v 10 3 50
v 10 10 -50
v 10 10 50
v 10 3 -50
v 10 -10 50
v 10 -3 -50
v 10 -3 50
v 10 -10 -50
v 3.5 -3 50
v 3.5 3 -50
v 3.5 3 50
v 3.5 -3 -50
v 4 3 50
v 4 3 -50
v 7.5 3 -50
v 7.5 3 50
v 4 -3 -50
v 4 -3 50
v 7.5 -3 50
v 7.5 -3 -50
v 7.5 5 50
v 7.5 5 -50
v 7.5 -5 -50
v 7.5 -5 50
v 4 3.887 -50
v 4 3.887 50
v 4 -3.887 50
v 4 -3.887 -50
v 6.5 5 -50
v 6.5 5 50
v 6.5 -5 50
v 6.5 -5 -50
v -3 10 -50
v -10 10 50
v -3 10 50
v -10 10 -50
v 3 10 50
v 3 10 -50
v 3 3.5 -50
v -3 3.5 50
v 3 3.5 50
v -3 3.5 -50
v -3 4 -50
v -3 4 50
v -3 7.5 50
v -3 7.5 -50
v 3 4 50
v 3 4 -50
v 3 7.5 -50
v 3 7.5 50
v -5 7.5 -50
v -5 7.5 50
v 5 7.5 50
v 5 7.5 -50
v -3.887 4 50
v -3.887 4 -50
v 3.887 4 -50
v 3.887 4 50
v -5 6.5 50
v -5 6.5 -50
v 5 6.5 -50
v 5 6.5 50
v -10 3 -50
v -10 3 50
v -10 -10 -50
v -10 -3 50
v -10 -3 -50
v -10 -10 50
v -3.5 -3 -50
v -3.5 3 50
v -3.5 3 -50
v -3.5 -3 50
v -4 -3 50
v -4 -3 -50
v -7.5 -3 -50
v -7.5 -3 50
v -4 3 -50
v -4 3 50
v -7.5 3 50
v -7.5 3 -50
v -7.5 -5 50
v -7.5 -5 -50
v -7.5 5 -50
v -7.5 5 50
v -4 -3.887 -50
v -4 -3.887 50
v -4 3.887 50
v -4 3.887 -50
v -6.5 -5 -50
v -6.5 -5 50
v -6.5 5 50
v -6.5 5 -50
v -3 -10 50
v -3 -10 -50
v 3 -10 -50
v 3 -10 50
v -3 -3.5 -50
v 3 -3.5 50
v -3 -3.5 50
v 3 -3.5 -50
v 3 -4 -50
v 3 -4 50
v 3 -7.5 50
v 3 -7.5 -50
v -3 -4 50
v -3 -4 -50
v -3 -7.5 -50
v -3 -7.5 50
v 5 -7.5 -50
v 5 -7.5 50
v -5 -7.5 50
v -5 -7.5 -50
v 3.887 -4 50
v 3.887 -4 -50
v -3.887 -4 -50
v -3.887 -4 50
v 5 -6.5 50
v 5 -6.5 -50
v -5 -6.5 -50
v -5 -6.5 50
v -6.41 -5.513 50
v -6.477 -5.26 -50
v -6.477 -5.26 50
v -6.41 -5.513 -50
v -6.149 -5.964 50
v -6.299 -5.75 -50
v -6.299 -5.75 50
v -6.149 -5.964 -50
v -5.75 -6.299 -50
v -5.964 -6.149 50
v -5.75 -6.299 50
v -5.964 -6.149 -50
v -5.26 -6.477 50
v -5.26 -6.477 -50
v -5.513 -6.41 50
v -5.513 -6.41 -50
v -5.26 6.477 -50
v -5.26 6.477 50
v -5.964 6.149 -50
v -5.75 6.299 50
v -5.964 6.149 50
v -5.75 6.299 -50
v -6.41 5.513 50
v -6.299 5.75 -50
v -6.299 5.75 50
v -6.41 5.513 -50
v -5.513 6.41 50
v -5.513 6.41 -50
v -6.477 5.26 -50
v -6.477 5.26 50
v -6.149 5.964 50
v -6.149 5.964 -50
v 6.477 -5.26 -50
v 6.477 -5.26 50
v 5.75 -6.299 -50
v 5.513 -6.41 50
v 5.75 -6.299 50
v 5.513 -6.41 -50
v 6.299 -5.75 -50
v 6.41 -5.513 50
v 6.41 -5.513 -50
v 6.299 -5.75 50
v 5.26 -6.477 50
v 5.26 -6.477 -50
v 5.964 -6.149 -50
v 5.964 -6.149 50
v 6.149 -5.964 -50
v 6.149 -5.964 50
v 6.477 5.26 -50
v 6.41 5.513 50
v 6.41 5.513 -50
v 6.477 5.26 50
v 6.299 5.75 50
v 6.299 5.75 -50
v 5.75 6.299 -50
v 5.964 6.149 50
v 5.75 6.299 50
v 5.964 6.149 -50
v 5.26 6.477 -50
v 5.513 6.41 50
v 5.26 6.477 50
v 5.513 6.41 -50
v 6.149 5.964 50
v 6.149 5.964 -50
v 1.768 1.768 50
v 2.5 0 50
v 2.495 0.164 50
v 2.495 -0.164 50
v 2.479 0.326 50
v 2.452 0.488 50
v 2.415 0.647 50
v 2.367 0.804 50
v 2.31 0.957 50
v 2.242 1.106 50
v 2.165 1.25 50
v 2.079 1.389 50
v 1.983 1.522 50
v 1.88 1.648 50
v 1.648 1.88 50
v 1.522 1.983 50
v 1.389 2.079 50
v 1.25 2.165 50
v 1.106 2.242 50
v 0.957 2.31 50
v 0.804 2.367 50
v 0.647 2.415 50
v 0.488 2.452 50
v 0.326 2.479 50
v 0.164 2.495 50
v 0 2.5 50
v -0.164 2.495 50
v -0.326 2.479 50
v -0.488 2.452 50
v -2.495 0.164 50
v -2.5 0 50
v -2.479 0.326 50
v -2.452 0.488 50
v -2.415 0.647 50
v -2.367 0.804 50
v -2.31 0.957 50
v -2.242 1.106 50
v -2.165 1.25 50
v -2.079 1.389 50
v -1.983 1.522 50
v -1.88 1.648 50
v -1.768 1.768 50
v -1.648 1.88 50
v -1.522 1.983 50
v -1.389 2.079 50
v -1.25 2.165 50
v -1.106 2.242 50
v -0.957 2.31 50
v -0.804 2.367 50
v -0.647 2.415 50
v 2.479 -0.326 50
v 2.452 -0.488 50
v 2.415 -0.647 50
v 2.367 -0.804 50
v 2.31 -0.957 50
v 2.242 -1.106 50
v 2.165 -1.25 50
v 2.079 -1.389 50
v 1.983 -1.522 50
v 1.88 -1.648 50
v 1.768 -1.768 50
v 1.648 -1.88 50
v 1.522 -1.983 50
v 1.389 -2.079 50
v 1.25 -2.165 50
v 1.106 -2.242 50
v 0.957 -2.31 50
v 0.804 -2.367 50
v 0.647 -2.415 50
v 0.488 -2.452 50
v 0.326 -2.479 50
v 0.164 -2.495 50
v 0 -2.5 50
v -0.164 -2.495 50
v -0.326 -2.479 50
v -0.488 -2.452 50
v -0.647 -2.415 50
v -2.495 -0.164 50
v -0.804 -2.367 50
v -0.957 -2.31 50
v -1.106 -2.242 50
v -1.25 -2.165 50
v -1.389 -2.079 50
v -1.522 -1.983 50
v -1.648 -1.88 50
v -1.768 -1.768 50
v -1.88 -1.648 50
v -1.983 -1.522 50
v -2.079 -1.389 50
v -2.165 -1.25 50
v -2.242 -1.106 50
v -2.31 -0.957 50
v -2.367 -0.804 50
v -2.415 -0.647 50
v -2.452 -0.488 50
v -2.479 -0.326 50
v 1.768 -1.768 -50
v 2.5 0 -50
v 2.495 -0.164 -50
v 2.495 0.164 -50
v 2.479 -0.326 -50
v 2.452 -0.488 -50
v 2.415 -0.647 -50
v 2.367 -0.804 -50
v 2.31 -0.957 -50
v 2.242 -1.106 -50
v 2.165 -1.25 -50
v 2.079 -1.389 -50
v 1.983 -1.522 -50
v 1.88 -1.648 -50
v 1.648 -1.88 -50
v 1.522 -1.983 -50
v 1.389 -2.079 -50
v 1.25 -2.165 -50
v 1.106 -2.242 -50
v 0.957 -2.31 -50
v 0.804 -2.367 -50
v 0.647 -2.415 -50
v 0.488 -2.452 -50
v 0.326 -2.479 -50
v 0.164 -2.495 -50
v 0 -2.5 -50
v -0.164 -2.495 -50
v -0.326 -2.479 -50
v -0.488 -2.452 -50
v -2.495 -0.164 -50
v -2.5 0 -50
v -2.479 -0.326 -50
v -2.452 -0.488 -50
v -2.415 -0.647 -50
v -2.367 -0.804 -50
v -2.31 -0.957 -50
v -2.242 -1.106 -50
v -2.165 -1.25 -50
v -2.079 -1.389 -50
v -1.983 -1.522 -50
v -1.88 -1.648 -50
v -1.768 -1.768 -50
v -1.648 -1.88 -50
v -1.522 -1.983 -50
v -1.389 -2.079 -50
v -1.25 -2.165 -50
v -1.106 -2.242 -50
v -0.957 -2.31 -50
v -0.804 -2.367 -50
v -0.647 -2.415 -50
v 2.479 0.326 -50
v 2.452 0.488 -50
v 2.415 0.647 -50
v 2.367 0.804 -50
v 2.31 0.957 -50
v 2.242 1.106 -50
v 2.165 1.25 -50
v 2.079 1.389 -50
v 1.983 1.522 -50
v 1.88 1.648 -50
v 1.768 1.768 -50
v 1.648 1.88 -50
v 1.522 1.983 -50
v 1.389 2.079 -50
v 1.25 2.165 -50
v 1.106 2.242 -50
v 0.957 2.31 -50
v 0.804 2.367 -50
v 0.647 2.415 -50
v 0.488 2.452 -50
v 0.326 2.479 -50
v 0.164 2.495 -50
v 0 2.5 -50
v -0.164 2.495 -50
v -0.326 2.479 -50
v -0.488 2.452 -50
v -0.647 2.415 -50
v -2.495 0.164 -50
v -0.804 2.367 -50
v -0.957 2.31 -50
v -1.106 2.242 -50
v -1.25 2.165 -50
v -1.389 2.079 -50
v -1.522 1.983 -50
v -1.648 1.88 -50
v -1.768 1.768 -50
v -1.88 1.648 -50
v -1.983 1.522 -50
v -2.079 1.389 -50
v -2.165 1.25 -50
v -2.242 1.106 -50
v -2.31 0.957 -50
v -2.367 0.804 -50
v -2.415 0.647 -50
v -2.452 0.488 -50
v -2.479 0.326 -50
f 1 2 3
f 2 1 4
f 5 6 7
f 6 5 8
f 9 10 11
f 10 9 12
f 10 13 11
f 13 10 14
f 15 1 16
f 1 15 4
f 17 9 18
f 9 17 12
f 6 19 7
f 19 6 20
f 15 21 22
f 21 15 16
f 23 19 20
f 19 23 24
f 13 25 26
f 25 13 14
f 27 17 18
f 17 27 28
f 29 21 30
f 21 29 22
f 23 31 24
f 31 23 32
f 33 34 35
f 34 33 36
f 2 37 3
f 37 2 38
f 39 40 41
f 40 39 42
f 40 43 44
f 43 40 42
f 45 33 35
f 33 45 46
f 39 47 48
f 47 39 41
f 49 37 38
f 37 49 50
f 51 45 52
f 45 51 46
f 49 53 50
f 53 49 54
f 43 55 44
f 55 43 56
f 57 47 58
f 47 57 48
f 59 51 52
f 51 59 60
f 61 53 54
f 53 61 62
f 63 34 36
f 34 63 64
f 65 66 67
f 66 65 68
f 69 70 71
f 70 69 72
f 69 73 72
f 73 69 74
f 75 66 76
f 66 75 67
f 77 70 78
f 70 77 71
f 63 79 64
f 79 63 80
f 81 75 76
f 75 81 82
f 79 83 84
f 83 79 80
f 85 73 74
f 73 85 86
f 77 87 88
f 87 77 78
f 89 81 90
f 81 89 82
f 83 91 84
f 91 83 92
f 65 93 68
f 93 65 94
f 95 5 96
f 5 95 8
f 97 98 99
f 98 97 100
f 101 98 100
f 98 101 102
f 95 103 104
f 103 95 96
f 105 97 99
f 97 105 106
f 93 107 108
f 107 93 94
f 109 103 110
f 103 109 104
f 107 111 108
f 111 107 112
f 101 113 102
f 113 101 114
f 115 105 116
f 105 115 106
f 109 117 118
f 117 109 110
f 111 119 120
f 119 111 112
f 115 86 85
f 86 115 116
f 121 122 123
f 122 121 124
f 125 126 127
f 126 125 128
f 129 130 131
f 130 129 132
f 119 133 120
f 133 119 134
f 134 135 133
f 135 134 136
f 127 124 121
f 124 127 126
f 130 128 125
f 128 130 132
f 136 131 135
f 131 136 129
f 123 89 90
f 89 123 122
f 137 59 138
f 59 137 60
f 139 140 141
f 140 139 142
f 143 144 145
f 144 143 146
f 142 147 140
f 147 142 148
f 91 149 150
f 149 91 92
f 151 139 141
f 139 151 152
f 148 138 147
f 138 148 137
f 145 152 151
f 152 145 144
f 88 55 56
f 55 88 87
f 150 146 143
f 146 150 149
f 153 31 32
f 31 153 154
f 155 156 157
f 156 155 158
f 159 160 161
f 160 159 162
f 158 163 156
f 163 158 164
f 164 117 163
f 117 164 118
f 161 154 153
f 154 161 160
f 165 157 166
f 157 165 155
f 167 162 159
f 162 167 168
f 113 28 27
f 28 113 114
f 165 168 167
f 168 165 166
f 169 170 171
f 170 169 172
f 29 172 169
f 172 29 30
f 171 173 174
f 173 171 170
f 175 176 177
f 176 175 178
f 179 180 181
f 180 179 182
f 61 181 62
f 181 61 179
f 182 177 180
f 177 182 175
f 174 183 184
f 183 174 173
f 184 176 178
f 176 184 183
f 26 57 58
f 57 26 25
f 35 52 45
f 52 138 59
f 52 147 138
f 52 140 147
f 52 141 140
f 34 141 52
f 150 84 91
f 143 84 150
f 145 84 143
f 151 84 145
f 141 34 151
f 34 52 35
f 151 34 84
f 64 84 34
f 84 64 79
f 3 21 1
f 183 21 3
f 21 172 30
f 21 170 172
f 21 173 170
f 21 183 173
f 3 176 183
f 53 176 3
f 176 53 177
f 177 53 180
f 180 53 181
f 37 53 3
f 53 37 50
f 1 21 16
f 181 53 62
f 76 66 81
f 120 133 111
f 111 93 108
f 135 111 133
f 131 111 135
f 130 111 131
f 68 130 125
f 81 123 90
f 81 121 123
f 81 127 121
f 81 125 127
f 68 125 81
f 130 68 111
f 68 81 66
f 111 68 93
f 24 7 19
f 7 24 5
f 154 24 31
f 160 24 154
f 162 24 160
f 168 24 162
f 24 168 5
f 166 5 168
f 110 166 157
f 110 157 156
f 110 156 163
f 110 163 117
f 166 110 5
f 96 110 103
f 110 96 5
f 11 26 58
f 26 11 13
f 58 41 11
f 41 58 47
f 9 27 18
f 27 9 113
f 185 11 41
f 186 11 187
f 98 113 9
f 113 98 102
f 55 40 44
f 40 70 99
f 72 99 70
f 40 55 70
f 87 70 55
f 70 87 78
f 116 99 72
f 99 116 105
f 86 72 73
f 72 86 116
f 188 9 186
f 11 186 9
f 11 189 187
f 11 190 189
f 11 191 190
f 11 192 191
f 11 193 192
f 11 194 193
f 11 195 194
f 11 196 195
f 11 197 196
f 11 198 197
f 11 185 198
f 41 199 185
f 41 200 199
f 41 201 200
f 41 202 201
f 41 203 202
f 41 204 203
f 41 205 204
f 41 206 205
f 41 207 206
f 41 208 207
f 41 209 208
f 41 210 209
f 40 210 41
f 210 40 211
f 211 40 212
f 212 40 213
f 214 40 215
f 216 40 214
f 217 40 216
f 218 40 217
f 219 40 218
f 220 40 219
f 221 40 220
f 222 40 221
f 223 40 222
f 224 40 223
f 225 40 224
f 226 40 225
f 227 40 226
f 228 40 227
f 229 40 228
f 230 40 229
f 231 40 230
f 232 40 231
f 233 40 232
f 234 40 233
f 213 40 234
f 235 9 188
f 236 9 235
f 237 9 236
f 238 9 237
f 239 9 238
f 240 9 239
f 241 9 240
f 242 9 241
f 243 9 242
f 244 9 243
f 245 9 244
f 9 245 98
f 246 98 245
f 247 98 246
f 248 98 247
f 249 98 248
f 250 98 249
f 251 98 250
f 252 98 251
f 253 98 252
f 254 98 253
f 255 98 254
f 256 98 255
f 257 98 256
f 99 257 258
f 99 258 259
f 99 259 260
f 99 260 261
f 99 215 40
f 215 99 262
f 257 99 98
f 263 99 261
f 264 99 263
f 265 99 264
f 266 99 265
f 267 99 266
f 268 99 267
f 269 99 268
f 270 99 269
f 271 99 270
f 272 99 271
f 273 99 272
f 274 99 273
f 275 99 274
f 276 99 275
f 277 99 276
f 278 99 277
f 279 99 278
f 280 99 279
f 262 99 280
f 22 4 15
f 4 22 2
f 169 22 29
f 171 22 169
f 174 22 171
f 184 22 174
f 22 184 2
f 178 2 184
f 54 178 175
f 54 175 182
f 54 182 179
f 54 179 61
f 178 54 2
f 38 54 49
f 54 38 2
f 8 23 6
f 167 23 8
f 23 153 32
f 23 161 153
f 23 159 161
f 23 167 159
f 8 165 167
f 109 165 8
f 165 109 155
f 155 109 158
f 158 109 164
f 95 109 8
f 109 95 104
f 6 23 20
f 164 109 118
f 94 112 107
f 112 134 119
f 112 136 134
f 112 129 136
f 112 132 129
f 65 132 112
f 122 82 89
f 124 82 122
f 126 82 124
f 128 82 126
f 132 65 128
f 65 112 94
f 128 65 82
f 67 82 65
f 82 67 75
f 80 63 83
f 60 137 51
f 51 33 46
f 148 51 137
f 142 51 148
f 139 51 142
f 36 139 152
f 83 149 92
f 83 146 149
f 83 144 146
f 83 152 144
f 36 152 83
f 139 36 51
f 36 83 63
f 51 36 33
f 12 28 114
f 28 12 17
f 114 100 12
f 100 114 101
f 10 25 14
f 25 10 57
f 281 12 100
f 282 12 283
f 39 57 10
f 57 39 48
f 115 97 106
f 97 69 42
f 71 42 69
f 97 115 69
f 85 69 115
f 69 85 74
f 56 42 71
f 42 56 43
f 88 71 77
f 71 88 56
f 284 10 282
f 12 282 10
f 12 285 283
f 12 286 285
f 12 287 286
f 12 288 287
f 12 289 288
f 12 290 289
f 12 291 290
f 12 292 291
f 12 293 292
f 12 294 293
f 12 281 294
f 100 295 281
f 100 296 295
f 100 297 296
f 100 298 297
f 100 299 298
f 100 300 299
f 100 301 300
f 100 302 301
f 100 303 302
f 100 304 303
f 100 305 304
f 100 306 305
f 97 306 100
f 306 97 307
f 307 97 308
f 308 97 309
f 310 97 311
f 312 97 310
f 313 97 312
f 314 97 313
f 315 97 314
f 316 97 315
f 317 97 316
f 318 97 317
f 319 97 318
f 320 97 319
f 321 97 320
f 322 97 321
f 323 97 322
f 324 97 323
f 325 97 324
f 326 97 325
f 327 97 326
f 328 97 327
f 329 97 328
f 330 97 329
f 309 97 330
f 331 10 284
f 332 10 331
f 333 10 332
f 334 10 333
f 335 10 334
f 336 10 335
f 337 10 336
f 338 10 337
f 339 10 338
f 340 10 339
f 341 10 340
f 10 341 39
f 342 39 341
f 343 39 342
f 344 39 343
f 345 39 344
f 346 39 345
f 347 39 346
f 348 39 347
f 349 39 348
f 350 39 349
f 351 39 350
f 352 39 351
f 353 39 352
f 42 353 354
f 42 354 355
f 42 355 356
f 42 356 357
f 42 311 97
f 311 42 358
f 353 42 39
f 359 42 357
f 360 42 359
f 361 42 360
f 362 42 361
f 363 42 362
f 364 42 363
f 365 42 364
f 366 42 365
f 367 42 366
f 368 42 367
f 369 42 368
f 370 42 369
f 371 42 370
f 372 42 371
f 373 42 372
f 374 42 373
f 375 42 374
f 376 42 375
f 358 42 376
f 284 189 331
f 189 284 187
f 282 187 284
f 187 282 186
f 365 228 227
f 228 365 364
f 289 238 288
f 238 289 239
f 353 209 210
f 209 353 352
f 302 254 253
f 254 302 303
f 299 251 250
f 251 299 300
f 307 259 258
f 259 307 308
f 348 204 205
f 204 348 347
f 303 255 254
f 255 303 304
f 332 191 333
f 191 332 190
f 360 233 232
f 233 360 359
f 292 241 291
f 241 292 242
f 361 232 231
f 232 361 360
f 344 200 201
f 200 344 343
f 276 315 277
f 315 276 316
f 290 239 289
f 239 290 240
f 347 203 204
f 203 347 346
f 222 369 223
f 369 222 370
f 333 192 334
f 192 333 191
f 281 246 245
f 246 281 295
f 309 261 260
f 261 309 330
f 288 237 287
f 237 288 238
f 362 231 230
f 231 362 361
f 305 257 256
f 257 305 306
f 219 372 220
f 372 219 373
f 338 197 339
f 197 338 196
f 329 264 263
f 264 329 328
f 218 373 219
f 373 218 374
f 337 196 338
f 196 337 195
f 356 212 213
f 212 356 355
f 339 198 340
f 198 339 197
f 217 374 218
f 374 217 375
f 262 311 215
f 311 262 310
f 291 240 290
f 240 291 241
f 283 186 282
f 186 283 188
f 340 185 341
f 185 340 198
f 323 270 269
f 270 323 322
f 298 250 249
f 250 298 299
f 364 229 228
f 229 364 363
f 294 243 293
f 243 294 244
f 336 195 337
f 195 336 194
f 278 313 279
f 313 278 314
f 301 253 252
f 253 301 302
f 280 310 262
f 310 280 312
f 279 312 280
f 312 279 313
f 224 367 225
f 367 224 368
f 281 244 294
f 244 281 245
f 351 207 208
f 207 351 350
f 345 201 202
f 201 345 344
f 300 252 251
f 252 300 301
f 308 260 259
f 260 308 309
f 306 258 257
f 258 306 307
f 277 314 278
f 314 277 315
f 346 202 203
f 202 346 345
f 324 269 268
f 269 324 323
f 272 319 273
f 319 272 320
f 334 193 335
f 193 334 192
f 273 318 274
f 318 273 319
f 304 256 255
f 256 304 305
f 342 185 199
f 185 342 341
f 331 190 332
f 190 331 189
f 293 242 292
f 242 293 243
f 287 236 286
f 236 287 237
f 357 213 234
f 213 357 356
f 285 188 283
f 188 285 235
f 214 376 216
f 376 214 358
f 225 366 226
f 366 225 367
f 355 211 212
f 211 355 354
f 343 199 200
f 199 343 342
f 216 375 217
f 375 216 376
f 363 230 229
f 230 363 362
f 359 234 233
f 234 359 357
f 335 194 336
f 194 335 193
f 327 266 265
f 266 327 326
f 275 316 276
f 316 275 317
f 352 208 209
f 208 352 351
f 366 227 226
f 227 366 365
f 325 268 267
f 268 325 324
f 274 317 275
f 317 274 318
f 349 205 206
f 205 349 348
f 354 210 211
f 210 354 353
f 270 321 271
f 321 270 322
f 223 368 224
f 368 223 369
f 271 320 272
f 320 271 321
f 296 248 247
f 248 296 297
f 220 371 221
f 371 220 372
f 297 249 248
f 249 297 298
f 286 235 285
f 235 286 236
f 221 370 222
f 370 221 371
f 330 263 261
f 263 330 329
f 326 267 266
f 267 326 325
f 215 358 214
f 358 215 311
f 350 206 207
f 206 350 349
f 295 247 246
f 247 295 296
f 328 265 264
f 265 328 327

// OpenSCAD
// 20x20 aluminium extrusion profile, 100mm long (single connected solid)

// Parameters
profile_width_mm  = 20.0;
profile_height_mm = 20.0;
length_mm         = 100.0;

center_part = true;

// Typical 2020-like features (simplified but recognizable)
slot_opening_mm          = 6.0;   // mouth width at outer face
slot_depth_mm            = 6.0;   // how far slot goes inward from outer face
slot_cavity_width_mm     = 10.0;  // wider undercut region
slot_cavity_depth_mm     = 3.0;   // depth of undercut region (near inner end)
center_bore_diameter_mm  = 5.0;

corner_relief_diameter_mm = 3.0;
corner_relief_offset_mm   = 5.0;
cornerHole                = 1;

overlap_mm = 0.5;

$fn = 96;

module extrusion_2020() {
  difference() {
    // Main body (square 20x20, length 100)
    cube([profile_width_mm, profile_height_mm, length_mm], center=center_part);

    // Center bore along length (Z axis)
    cylinder(d=center_bore_diameter_mm, h=length_mm + 2*overlap_mm, center=center_part);

    // T-slots on 4 sides (cut along length)
    for (a = [0, 90, 180, 270]) {
      rotate([0, 0, a]) {
        // Slot opening (narrow) from outer face inward
        translate([
          profile_width_mm/2 - (slot_depth_mm + overlap_mm)/2,
          0,
          0
        ])
          cube([slot_depth_mm + overlap_mm, slot_opening_mm, length_mm + 2*overlap_mm], center=true);

        // Slot cavity (wider) near inner end of slot
        translate([
          profile_width_mm/2 - slot_depth_mm + (slot_cavity_depth_mm + overlap_mm)/2,
          0,
          0
        ])
          cube([slot_cavity_depth_mm + overlap_mm, slot_cavity_width_mm, length_mm + 2*overlap_mm], center=true);
      }
    }

    // Corner relief holes (optional), along length
    if (cornerHole) {
      for (sx = [-1, 1], sy = [-1, 1]) {
        translate([sx*corner_relief_offset_mm, sy*corner_relief_offset_mm, 0])
          cylinder(d=corner_relief_diameter_mm, h=length_mm + 2*overlap_mm, center=center_part, $fn=36);
      }
    }
  }
}

extrusion_2020();
